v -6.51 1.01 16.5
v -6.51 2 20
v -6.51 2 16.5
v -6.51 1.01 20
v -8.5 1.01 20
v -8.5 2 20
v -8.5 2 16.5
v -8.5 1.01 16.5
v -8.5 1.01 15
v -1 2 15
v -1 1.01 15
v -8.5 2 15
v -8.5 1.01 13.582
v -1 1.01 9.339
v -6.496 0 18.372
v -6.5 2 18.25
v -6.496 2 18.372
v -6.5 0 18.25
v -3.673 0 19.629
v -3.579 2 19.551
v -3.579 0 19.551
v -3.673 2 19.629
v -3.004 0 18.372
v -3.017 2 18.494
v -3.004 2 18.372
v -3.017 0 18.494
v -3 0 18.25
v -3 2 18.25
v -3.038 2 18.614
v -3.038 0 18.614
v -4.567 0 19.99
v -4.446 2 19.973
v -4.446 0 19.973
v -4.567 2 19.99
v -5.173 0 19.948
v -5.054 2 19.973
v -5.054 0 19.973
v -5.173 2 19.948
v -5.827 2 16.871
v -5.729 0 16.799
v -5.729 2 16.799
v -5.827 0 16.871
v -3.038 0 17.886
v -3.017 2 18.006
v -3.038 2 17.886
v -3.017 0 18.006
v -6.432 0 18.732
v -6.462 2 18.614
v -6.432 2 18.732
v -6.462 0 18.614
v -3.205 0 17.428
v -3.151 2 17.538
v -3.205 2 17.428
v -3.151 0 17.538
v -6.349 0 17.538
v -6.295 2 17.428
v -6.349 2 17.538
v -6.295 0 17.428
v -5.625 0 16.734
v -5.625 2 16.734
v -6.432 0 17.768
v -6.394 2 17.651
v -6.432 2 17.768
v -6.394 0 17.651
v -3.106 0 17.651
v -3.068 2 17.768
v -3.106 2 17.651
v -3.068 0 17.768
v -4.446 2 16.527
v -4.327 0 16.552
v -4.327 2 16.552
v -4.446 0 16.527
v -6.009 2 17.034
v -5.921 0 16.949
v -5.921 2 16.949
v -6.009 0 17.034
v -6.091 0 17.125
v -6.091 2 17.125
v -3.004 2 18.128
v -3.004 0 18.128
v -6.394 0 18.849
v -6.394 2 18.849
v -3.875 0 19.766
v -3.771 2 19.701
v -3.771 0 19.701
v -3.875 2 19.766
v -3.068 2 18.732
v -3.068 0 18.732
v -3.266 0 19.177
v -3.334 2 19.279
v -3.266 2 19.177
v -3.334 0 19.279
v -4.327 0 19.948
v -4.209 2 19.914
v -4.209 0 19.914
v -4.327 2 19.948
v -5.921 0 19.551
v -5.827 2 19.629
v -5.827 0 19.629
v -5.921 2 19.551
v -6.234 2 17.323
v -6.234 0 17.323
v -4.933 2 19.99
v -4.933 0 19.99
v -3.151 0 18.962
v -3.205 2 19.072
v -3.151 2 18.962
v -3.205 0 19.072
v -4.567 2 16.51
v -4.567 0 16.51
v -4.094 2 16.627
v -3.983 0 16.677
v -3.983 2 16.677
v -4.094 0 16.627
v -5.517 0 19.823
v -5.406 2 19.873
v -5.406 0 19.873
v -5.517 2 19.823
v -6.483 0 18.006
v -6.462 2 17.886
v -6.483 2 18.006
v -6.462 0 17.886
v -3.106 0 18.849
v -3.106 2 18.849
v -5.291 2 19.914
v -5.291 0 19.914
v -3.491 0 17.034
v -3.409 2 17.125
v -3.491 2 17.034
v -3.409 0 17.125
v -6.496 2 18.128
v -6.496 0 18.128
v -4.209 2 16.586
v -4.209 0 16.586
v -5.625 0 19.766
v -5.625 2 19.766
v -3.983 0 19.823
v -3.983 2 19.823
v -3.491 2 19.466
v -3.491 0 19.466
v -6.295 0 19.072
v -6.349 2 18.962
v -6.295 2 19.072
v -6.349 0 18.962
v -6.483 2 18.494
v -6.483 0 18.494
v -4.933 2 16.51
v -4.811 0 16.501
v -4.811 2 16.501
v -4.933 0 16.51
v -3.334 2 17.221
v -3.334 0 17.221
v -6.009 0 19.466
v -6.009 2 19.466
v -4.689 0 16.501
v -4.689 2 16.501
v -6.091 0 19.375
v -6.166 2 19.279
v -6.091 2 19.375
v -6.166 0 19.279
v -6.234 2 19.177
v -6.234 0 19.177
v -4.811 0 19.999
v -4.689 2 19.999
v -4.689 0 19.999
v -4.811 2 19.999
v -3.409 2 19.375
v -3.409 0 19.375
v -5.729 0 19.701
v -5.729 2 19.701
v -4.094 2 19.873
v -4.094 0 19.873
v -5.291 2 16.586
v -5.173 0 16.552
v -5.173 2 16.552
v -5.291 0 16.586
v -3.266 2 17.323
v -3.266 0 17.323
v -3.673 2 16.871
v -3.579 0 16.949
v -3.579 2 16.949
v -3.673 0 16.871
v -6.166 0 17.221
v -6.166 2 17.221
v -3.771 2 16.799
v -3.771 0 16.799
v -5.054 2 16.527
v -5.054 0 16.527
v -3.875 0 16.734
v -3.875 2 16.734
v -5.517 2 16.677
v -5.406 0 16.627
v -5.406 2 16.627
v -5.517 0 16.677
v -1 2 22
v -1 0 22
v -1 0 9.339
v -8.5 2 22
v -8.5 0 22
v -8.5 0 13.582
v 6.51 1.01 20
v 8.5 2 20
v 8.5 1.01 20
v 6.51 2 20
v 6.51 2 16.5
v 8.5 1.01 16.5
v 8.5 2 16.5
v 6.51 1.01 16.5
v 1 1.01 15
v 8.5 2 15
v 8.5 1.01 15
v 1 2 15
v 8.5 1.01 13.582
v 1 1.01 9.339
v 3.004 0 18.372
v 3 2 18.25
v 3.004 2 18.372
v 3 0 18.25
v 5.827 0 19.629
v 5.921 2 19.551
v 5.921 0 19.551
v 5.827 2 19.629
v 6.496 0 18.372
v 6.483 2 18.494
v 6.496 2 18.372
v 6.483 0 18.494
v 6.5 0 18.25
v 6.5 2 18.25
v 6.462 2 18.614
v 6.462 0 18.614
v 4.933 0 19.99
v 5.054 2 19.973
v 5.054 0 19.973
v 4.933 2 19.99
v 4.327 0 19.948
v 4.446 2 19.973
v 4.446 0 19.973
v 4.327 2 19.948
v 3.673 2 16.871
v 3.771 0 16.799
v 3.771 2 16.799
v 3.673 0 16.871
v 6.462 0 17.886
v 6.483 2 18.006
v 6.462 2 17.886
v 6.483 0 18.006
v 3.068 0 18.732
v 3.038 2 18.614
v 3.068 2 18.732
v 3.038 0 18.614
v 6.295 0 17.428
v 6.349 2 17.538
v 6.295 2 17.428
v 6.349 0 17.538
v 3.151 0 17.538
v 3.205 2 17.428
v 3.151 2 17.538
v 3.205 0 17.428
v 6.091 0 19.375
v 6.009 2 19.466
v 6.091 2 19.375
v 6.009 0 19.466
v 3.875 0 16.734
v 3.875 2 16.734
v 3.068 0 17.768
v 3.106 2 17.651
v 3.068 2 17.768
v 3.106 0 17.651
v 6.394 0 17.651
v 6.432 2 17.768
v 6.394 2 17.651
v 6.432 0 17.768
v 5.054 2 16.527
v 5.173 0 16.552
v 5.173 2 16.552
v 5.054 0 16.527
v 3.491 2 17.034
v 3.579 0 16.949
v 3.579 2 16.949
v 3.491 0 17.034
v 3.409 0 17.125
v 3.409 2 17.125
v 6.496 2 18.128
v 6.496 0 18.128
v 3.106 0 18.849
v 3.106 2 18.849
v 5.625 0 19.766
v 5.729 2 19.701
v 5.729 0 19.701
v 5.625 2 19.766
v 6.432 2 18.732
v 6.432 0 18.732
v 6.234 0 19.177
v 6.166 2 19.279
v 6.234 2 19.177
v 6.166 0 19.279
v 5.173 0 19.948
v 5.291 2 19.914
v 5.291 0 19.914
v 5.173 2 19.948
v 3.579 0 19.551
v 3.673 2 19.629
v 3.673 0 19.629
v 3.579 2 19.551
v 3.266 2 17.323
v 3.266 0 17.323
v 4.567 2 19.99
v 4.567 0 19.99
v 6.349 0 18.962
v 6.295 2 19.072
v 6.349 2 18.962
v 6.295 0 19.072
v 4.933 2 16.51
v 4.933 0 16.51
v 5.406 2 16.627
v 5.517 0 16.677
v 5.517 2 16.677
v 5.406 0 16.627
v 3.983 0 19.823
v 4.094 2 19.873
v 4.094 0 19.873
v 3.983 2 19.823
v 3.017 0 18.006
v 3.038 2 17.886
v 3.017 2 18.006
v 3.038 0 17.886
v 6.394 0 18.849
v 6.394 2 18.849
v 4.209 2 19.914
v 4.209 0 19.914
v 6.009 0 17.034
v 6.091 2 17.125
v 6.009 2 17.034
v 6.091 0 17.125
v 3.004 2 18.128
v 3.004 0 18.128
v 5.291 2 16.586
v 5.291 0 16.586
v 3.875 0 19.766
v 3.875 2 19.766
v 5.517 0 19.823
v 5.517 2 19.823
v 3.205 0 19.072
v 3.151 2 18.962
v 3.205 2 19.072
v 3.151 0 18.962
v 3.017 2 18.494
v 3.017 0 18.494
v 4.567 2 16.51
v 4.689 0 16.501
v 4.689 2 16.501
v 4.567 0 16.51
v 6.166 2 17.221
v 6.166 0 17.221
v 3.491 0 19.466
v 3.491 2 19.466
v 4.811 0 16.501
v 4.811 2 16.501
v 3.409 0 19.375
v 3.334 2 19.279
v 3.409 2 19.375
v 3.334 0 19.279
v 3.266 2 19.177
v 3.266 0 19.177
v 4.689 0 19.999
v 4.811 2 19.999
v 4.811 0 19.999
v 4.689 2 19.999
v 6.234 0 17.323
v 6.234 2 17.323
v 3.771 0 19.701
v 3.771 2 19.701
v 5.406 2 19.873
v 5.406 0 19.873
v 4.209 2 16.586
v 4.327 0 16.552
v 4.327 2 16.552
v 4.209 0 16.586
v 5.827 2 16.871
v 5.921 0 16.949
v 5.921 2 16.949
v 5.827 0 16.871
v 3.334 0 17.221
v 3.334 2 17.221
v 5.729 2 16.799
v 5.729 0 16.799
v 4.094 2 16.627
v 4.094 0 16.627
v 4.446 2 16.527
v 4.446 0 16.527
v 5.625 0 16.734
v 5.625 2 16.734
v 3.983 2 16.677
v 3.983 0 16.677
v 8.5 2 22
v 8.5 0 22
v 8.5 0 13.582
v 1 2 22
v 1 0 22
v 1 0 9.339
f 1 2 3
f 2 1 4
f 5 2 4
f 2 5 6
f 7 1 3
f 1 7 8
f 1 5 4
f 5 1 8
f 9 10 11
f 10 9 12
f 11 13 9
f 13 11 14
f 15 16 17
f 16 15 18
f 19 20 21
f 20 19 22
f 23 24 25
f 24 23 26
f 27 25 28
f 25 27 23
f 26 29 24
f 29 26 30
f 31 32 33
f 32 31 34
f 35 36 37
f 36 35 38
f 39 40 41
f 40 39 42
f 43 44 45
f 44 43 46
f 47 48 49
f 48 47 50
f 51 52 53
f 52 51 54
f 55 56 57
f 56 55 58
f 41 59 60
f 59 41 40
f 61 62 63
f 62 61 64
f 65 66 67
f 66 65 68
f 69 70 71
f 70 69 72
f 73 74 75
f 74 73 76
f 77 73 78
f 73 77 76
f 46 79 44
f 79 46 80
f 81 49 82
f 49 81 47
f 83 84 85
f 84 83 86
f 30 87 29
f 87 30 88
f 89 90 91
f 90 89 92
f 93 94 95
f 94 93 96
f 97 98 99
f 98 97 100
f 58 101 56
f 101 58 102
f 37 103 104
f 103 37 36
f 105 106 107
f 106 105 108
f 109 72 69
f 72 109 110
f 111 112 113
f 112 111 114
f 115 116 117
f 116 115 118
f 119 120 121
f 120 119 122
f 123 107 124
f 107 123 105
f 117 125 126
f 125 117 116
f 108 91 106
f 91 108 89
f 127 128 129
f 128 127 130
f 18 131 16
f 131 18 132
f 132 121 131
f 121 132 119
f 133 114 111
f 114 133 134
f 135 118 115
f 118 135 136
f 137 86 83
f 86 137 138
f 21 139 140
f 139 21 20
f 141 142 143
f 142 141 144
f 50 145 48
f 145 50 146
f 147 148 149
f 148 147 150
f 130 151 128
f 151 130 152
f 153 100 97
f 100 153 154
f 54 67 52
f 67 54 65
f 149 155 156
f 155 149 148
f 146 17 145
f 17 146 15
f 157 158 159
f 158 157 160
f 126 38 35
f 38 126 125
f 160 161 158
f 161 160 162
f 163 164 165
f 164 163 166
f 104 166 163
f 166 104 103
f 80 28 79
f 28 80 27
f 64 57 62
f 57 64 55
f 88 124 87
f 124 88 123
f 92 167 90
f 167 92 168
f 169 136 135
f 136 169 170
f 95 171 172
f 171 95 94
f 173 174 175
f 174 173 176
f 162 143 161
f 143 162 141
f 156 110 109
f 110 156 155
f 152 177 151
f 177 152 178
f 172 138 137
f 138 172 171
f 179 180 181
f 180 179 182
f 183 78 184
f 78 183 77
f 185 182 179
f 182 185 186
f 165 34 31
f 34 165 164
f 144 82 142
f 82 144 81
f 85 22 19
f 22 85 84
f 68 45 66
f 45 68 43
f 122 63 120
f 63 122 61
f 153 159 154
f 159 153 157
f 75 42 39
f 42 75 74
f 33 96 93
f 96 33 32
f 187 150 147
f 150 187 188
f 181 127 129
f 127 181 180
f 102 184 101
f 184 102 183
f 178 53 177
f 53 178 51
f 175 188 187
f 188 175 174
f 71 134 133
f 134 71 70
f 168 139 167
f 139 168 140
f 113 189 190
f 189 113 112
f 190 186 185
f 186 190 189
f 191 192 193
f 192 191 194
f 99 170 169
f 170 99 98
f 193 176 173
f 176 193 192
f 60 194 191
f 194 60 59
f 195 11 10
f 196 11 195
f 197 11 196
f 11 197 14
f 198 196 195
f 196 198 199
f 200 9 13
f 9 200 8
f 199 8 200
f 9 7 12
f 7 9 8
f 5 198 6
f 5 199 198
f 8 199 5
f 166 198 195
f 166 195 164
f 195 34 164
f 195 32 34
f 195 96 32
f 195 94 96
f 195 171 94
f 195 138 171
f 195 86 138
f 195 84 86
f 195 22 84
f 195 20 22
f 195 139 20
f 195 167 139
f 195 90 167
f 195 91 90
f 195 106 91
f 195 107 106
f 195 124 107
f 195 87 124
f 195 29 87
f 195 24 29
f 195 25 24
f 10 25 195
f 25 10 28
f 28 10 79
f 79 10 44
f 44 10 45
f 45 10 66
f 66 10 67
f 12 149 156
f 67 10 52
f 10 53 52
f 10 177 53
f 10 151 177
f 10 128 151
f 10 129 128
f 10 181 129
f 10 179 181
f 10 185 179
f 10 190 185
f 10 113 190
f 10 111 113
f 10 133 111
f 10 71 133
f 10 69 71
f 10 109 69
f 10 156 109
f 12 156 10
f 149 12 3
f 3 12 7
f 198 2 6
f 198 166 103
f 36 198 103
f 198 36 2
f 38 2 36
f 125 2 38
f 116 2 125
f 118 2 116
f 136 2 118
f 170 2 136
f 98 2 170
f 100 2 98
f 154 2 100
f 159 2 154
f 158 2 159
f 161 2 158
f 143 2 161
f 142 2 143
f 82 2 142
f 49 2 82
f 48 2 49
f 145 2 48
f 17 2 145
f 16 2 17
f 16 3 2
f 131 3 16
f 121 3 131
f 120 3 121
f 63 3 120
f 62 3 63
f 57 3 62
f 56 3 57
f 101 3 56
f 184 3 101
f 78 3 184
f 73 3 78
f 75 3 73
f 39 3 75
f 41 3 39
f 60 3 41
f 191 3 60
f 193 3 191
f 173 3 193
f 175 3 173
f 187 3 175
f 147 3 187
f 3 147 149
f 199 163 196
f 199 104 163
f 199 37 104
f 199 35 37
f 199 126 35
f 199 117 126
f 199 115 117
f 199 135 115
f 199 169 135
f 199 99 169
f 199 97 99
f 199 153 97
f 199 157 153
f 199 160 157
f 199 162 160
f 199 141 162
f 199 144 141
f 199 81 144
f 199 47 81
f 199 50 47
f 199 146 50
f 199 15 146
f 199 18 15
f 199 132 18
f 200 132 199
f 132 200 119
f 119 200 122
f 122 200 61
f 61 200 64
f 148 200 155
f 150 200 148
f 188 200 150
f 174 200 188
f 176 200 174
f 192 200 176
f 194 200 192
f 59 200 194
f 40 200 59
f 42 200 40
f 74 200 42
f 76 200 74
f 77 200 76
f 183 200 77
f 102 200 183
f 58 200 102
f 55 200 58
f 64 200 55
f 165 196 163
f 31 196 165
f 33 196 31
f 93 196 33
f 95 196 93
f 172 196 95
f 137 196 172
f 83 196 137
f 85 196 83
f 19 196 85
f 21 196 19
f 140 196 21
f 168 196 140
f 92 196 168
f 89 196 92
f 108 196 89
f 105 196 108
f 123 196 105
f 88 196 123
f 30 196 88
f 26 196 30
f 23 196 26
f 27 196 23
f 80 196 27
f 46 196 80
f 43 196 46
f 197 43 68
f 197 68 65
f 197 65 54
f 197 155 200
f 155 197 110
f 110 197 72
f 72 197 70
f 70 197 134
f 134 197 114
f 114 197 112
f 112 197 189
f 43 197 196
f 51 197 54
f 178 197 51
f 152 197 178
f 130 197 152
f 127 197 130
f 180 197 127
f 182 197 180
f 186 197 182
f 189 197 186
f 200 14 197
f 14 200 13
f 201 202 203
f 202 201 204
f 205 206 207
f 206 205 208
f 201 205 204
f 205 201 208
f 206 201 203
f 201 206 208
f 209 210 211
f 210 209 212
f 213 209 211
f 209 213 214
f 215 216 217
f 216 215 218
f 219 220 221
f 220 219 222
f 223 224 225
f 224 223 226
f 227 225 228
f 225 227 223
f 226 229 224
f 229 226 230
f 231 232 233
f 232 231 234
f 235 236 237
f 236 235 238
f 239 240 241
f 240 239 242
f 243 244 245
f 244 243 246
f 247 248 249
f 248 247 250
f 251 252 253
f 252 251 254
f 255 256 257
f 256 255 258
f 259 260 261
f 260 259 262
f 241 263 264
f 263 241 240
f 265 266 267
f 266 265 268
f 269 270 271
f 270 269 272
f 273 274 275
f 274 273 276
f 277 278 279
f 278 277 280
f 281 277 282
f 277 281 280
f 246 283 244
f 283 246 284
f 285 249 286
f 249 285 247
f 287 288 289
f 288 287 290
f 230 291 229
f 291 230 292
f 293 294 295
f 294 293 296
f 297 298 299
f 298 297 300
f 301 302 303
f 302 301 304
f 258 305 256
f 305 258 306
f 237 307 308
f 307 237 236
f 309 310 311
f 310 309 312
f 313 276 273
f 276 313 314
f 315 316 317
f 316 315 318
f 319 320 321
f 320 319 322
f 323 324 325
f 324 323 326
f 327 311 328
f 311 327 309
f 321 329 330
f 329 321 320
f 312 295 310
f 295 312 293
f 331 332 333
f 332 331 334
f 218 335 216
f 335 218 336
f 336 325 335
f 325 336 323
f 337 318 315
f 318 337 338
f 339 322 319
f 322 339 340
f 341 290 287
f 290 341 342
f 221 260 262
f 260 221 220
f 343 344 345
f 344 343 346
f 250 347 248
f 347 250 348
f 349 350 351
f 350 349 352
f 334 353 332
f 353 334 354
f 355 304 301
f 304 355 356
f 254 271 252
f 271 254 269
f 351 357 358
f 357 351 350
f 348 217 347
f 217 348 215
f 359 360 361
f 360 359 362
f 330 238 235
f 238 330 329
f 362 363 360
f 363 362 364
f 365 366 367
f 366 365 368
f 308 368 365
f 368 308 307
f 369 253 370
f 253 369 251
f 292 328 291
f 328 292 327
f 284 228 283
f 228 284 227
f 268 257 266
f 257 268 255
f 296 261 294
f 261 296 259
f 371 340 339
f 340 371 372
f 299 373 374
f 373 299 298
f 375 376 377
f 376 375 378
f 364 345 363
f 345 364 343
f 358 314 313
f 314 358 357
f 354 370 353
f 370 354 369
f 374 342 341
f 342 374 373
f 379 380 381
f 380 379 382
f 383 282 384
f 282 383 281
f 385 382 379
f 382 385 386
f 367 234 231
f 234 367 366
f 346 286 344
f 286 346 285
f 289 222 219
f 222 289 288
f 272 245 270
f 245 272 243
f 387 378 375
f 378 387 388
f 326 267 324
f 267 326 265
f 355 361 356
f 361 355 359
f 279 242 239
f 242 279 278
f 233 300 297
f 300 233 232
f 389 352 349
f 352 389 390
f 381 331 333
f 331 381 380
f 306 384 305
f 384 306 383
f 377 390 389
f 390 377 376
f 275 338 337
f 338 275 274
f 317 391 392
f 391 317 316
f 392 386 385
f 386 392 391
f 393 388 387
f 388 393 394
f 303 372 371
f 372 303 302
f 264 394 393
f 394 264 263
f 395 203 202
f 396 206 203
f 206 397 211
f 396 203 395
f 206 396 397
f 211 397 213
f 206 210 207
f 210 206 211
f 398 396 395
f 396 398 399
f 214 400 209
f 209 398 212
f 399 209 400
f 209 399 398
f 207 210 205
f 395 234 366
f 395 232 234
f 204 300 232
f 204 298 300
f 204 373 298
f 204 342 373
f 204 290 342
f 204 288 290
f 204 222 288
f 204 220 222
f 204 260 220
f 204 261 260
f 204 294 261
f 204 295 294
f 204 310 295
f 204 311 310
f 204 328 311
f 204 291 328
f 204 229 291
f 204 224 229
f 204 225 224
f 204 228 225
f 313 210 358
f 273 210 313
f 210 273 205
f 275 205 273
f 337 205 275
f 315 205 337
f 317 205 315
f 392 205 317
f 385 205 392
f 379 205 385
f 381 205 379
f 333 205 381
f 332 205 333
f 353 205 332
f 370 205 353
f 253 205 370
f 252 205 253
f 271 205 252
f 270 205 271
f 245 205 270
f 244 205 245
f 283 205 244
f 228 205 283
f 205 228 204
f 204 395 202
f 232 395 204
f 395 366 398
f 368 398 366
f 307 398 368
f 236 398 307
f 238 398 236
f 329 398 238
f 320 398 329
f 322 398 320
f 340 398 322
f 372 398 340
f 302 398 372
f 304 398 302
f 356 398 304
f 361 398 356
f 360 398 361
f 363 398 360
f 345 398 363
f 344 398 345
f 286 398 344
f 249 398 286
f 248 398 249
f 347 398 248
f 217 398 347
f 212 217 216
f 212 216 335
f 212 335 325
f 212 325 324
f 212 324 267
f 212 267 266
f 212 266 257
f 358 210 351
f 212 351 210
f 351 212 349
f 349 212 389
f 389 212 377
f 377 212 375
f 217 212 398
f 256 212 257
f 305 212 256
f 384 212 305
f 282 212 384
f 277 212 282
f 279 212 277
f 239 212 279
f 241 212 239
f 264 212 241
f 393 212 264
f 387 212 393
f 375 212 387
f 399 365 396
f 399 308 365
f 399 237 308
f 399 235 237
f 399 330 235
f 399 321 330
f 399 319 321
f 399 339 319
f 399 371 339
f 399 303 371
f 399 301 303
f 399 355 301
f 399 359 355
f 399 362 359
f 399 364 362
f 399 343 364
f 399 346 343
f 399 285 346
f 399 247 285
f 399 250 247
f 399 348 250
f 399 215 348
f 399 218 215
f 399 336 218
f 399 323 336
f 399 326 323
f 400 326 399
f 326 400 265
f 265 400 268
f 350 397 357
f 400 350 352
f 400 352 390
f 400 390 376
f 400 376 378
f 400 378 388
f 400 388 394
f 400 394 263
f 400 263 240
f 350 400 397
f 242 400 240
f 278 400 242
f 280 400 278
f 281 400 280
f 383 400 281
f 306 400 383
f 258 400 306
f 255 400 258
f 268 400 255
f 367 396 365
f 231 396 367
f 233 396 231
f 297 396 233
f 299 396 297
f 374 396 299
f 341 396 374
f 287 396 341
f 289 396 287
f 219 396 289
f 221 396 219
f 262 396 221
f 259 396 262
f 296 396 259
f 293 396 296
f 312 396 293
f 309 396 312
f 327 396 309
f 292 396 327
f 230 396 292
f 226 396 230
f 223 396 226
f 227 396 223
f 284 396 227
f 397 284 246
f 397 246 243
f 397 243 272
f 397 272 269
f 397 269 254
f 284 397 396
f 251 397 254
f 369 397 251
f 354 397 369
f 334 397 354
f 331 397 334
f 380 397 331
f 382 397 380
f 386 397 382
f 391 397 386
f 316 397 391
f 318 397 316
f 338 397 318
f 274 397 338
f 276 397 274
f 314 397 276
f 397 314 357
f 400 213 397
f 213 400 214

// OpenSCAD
// general parameters
$fn = 90;
eps = 0.01;
t_tol = 0.2;

g_l = 9;

// metal tip bigger diamer length
mt_l = 13.3;
extention = mt_l+0.7;

// hole parameters
d = 5.2+t_tol;
D = 7.5+t_tol;
H = 27-13.3;
h = 1.5;

echo(h+H-extention);

// body parameters
wt = 1;
y_o = 1;

// connectors parameters
// connector bolt diameter
c_bd = 3.5;
// connector nut diameter
c_nd = 6.5;
// connector wall thickness
c_wt = 2;
// distance from one hole to another
c_l = 77.5+2*c_bd+2*c_wt;
// offset in x axis
c_xo = -(c_l-8*g_l)/2;
// connector dimension size in x axis
c_x = 2*c_wt+c_bd;
// connectors y offset
c_yo = 1.5-2;
// connector dimension in y axis
c_y = 2*c_wt;
// connector dimension in z axis
c_z = mt_l+3.2+c_bd+c_wt;


// box parameters
x = 8*g_l;
y = g_l;
z = h+H;

module distancers()
{
    // connector connector            
    _h = H+h-2*extention/3;
    _ho = H+h-_h;
    _w = 2;
    
    translate([-c_x-1,0,0])
    difference()
    {
        translate([0,0,_ho])
            cube([c_x,_w,c_z-_ho]);
        
        // bolt hole
        translate([c_x/2,_w+eps,c_z-c_bd/2-c_wt])
        {
            rotate([90,0,0])
            {
                // bolt hole
                cylinder(d=c_bd,h=g_l/2+c_yo+2*eps);
            }
            
            // support plane cuts
            translate([0,-1,0])
            {
                translate([-c_x/2-eps,0,-c_bd/2]) cube([c_wt,1,c_bd]);
                translate([-c_x/2-eps,0,-c_nd/2-5*c_wt]) cube([c_x+2*eps,1,5*c_wt]);
            }
        }
        
        // left sloped cut
        translate([c_xo+c_x,c_yo,2*extention/3]) hull()
        {
            translate([0,g_l/2+eps,0]) rotate([90,0,0])
                cylinder(d=eps,h=g_l/2+c_yo+2*eps);
            translate([-c_xo,g_l/2+eps,0]) rotate([90,0,0])
                cylinder(d=eps,h=g_l/2+c_yo+2*eps);
            translate([0,g_l/2+eps,extention/3]) rotate([90,0,0])
                cylinder(d=eps,h=g_l/2+c_yo+2*eps);
        }
    }
    
    translate([1,0,0])
    difference()
    {
        translate([0,0,_ho])
            cube([c_x,_w,c_z-_ho]);
        
        // screw hole for M3 bolt and nut
        translate([c_x/2,_w+eps,c_z-c_bd/2-c_wt])
        {
            rotate([90,0,0])
            {
                // bolt hole
                cylinder(d=c_bd,h=g_l/2+c_yo+2*eps);
            }
            
            // support plane cuts
            translate([0,-1,0])
            {
                translate([c_x/2-c_wt+eps,0,-c_bd/2]) cube([c_wt+2*eps,1,c_bd]);
                translate([-c_x/2-eps,0,-c_nd/2-5*c_wt]) cube([c_x+2*eps,1,5*c_wt]);
            }
        }

        
        
        // right sloped cut
        translate([0,c_yo,2*extention/3]) hull()
        {
            translate([-c_xo,g_l/2+eps,0]) rotate([90,0,0])
                cylinder(d=eps,h=g_l/2+c_yo+2*eps);
            translate([0,g_l/2+eps,0]) rotate([90,0,0])
                cylinder(d=eps,h=g_l/2+c_yo+2*eps);
            translate([-c_xo,g_l/2+eps,extention/3]) rotate([90,0,0])
                cylinder(d=eps,h=g_l/2+c_yo+2*eps);
        }
    }
}

distancers();

module pipet_tip_holder()
{
    difference()
    {
        //%cube([x,y,z]);
        
        union()
        {
            // main holder body
            hull()
            {
                cylinder(d=g_l,h=H+h);
                translate([7*g_l,0,0]) cylinder(d=g_l,h=H+h);
            }
            
            // extention 
            %translate([c_xo-g_l/2,-c_y,0])
                cube([c_l,c_y,extention]);
            
            // connector connector            
            _h = H+h-2*extention/3;
            _ho = H+h-_h;
            translate([c_xo-g_l/2,-g_l/2,_ho])
                cube([c_l,g_l/2+c_yo,_h]);
            // left connector
            translate([c_xo-g_l/2,-g_l/2,_ho])
                cube([c_x,g_l/2+c_yo,c_z-_ho]);
            // right connector
            translate([c_l+c_xo-c_x-g_l/2,-g_l/2,_ho])
                cube([c_x,g_l/2+c_yo,c_z-_ho]);
                
        }
        
        // holes for pipet heads
        for(i=[0:7])
        {
            
            //if(i==0 || i==7)
            _xo = i*g_l;
            _D = (i==0 || i==7) ? D + 0.2 : D;
            translate([_xo,0,0])
            {
                translate([0,0,h-eps]) cylinder(h=H+2*eps,d=_D);
                translate([0,0,-eps])cylinder(h=h+2*eps,d=d);
            }
        }
        
        // left connector bolt hole
        translate([c_xo-g_l/2,-c_y+c_yo,0])
        {
            // bolt hole
            translate([c_x/2,c_y+eps,c_z-c_bd/2-c_wt])
            {
                rotate([90,0,0])
                {
                    // bolt hole
                    cylinder(d=c_bd,h=g_l/2+c_yo+2*eps);
                    // nut hole
                    translate([0,0,g_l/2+c_yo-1+eps])
                        cylinder(d=c_nd,h=g_l/4+2*eps,$fn=6);
                }
                
                /*
                // support plane cuts
                translate([0,-1,0])
                {
                    translate([-c_x/2-eps,0,-c_bd/2]) cube([c_wt,1,c_bd]);
                    translate([-c_x/2-eps,0,-c_nd/2-5*c_wt]) cube([c_x,1,5*c_wt]);
                }
                */
                
                
            }
            
        }
        
        // right connector bolt hole
        translate([c_l+c_xo-c_x-g_l/2,-c_y+c_yo,0])
        {
            // screw hole for M3 bolt and nut
            translate([c_x/2,c_y+eps,c_z-c_bd/2-c_wt])
            {
                rotate([90,0,0])
                {
                    // bolt hole
                    cylinder(d=c_bd,h=g_l/2+c_yo+2*eps);
                    // nut hole
                    translate([0,0,g_l/2+c_yo-1+eps])
                        cylinder(d=c_nd,h=g_l/4+2*eps,$fn=6);
                }
                
                /*
                // support plane cuts
                translate([0,-1,0])
                {
                    translate([c_x/2-c_wt+eps,0,-c_bd/2]) cube([c_wt,1,c_bd]);
                    translate([-c_x/2+eps,0,-c_nd/2-5*c_wt]) cube([c_x,1,5*c_wt]);
                }
                */
            }
        }
        
        // left sloped cut
        translate([c_xo-g_l/2,c_yo-g_l/2,2*extention/3]) hull()
        {
            translate([0,g_l/2+eps,0]) rotate([90,0,0])
                cylinder(d=eps,h=g_l/2+c_yo+2*eps);
            translate([-c_xo,g_l/2+eps,0]) rotate([90,0,0])
                cylinder(d=eps,h=g_l/2+c_yo+2*eps);
            translate([0,g_l/2+eps,extention/3]) rotate([90,0,0])
                cylinder(d=eps,h=g_l/2+c_yo+2*eps);
        }
        
        // right sloped cut
        translate([x-g_l/2,c_yo-g_l/2,2*extention/3]) hull()
        {
            translate([-c_xo,g_l/2+eps,0]) rotate([90,0,0])
                cylinder(d=eps,h=g_l/2+c_yo+2*eps);
            translate([0,g_l/2+eps,0]) rotate([90,0,0])
                cylinder(d=eps,h=g_l/2+c_yo+2*eps);
            translate([-c_xo,g_l/2+eps,extention/3]) rotate([90,0,0])
                cylinder(d=eps,h=g_l/2+c_yo+2*eps);
        }
            
    }
    
    
}

//pipet_tip_holder();
